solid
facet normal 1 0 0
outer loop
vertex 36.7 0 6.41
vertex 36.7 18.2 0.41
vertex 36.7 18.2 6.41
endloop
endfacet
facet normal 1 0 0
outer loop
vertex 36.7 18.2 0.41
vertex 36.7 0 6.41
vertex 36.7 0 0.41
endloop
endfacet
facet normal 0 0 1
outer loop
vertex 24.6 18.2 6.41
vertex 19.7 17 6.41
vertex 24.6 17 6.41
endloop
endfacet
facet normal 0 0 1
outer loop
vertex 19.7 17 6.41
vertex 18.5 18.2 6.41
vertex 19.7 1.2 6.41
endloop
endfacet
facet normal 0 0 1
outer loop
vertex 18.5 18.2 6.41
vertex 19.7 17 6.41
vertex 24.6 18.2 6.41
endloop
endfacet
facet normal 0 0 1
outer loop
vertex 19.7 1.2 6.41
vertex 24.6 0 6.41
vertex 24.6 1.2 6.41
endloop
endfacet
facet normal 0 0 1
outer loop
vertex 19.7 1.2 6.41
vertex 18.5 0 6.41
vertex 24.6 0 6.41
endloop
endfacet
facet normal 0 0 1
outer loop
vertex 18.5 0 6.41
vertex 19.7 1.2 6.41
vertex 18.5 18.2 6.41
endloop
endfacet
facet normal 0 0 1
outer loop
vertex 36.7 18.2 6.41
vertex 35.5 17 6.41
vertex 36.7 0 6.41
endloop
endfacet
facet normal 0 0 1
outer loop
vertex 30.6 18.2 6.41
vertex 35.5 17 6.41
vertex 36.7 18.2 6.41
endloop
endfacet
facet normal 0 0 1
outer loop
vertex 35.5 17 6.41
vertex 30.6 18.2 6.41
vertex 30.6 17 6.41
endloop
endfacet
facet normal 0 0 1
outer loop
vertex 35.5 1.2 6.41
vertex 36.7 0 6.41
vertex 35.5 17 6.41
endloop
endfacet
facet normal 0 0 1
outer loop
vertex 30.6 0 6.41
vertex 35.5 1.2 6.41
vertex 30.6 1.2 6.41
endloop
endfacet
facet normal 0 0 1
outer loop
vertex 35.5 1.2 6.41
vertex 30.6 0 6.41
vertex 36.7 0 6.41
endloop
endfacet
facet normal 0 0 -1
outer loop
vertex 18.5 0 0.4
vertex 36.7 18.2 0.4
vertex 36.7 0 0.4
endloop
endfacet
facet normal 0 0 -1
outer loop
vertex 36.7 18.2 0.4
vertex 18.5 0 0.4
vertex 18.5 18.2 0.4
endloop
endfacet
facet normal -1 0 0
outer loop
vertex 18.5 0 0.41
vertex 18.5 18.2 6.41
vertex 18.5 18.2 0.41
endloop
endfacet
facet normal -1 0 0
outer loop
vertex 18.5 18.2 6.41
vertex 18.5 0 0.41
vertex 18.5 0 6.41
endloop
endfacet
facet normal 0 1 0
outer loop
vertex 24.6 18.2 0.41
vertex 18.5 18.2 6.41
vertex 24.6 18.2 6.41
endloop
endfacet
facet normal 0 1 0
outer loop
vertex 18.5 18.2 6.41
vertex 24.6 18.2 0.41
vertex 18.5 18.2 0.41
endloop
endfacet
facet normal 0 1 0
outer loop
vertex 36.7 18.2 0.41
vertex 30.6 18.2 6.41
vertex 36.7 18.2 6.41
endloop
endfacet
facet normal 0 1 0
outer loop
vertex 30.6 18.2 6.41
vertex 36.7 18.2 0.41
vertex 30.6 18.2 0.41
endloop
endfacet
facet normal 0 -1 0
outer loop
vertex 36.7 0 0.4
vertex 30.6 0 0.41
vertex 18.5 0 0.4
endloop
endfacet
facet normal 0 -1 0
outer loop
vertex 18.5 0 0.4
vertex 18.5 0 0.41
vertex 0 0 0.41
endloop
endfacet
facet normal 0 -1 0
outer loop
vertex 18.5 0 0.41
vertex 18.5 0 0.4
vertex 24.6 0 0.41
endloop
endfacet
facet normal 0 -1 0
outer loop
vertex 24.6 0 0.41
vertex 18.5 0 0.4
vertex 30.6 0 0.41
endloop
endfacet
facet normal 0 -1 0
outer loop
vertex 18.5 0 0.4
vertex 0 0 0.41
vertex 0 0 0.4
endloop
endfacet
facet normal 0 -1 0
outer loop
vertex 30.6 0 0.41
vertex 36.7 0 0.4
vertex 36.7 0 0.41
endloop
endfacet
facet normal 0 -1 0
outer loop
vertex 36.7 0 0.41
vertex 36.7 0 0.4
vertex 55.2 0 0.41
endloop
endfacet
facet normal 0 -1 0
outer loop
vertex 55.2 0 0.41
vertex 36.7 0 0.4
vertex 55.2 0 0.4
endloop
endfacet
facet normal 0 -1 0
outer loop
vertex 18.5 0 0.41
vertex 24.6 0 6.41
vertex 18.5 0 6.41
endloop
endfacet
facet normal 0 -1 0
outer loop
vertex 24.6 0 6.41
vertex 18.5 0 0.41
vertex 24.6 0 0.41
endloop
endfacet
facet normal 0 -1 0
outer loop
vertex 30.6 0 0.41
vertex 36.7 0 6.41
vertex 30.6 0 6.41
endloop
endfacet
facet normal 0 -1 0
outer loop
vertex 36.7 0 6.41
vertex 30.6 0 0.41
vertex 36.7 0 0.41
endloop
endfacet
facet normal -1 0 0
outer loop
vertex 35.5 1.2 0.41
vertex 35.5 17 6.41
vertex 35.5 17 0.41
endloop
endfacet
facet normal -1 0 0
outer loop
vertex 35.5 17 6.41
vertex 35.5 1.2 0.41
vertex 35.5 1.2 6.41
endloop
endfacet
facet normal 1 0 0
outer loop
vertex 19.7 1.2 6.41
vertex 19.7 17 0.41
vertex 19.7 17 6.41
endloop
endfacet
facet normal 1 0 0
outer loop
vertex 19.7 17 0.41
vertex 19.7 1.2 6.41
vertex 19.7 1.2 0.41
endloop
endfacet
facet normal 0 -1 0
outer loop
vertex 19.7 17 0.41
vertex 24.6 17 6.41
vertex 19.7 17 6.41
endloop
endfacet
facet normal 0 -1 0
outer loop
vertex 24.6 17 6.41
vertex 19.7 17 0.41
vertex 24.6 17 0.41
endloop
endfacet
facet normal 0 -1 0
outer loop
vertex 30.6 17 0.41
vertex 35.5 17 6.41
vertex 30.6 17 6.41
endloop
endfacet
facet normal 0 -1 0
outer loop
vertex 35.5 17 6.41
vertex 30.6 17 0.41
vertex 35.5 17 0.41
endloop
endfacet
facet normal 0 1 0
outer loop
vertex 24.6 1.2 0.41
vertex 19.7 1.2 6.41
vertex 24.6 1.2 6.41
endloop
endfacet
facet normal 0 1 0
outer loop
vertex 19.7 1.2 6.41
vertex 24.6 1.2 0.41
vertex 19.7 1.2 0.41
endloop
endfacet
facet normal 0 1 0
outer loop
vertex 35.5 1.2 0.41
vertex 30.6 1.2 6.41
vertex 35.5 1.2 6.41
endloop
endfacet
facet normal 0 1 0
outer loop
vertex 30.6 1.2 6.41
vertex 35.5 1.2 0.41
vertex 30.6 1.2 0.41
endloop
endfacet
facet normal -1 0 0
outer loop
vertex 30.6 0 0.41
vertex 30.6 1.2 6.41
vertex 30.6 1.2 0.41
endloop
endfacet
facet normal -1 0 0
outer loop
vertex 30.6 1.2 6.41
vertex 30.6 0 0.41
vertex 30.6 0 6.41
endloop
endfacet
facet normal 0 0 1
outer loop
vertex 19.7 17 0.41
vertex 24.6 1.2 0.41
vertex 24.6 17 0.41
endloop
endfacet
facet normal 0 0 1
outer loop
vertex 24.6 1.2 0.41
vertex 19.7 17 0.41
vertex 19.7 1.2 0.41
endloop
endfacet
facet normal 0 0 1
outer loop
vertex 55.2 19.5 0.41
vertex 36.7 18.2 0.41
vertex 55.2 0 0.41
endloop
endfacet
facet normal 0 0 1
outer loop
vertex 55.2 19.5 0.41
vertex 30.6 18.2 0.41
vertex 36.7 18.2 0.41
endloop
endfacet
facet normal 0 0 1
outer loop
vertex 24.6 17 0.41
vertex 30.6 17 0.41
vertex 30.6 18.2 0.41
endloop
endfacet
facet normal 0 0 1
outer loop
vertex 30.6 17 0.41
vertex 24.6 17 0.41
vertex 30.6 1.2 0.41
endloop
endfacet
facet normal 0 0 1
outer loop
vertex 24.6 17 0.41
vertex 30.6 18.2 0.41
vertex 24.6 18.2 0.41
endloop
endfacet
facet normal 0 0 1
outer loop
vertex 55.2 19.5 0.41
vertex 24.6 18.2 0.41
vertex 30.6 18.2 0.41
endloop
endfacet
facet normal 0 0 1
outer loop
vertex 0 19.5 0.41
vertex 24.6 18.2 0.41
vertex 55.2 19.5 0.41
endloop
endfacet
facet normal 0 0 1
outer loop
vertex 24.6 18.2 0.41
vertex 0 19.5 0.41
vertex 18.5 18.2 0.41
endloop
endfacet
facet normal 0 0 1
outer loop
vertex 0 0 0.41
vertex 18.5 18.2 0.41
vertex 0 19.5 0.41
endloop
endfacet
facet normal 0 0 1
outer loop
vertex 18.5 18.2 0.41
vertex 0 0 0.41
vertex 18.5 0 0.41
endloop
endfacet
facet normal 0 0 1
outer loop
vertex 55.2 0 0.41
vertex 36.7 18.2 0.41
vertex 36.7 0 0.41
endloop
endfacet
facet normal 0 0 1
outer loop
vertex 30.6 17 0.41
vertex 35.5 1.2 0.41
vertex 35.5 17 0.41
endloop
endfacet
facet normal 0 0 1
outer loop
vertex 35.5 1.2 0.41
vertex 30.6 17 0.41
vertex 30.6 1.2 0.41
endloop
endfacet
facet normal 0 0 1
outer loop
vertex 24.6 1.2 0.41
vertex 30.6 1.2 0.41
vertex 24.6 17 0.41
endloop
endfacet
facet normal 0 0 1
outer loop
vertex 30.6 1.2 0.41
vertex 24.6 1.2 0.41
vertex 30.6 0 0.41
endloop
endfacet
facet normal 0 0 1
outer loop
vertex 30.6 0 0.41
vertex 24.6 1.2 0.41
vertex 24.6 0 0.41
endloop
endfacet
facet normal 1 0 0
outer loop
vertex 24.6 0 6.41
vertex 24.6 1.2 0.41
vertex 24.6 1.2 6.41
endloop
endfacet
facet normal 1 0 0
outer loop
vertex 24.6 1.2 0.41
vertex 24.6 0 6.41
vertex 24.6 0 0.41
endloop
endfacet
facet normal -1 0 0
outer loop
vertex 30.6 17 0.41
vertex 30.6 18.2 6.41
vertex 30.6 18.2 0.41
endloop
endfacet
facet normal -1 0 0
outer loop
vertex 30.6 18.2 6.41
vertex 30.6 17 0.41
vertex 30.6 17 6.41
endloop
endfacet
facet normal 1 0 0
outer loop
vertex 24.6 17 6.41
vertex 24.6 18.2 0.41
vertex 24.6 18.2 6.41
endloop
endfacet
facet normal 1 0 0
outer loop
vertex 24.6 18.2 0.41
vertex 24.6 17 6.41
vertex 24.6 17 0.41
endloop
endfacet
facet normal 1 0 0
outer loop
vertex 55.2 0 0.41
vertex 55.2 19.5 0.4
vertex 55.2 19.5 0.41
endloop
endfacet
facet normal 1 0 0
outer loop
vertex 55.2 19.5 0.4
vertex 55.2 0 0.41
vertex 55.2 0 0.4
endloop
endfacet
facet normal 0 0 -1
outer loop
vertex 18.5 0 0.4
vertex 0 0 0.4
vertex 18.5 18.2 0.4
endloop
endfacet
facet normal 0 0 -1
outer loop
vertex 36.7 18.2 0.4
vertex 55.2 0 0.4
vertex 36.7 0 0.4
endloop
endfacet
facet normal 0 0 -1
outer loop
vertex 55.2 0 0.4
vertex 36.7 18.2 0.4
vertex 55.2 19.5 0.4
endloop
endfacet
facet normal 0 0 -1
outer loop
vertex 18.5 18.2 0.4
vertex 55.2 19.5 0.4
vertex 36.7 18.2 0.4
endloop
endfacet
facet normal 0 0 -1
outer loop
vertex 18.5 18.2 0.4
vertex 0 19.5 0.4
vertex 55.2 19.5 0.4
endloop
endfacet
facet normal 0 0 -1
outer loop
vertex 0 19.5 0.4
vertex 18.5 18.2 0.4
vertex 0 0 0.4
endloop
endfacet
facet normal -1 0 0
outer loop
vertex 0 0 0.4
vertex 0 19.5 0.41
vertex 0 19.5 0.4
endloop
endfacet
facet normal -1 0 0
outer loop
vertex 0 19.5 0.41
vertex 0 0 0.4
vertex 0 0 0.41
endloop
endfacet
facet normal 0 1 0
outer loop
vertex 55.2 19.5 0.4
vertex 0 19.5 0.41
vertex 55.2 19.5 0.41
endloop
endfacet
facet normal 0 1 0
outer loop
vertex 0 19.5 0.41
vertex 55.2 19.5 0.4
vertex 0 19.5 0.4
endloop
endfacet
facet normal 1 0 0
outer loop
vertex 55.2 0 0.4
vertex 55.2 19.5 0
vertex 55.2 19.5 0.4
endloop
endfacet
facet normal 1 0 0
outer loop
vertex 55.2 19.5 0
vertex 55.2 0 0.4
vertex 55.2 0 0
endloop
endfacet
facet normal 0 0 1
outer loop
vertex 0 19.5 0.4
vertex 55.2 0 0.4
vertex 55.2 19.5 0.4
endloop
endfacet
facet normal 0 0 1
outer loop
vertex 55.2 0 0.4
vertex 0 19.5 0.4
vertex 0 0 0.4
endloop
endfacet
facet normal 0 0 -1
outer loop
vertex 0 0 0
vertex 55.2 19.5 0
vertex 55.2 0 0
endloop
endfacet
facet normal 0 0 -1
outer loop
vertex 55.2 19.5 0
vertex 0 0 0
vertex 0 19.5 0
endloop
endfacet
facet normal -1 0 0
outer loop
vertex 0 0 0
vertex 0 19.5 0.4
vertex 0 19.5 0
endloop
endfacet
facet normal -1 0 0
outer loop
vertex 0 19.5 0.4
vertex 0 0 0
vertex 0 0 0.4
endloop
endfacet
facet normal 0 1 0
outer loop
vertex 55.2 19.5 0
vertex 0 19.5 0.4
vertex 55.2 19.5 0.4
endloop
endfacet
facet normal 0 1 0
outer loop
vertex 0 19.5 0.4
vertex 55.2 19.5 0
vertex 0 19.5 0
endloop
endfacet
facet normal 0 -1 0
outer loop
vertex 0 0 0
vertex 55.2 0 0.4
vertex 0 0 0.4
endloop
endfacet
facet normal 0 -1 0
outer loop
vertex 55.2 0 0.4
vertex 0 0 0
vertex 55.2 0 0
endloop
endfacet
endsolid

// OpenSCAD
// file: ../../Base/PlacementOptions.scad
// Fischertechnik Box Foundation
// Placement Options

// Alignment
NoAlign = 0;
AlignLeft = 1;
AlignBottom = 2;
AlignCenter = 3;
AlignRight = 4;
AlignTop = 5;

// Element rotation degree steps
rotations = [0, -90, -180, -270];

// Rotation
NoRotation = 0;
Rotate0 = 0;
Rotate90 = 1;
Rotate180 = 2;
Rotate270 = 3;

// Docking (seen from above)
NoDock = -1;
DockLeft = 0;
DockTop = 1;
DockRight = 2;
DockCorner = 2;
DockBottom = 3;

// Web corners
LowerLeft = 0;
UpperLeft = 1;
UpperRight = 2;
LowerRight = 3;

// Web position relative to corner
LeftOfCorner = 0;
RightOfCorner = 1;
// file: ../../Base/Boxes.scad
// Fischertechnik Box Foundation
// Pre-designed Boxes

use <Constants.scad>

include <PlacementOptions.scad>

box190Width = 190;
box190Depth = 130;
box130Width = 130;
box130Depth = 95;

// Values are from an original ec3 box
topBottomDifference = 1.5;
outerHeight = 40;
baseThickness = 1.8;
innerHeight = outerHeight - baseThickness;
stackExcess = 5.7;
radius = 3.5;
wallThickness = 1.5;
tolerance = 0.2;

boxWallThickness = wallThickness;
boxBaseThickness = baseThickness;
boxWebWidth = 3.0;

// getBoxWallThickness()
// Gets the wall thickness of a Fischertechnik Box
function getBoxWallThickness() = boxWallThickness;

// getBoxUsageHeight(height = 38.2)
// Gets the usable height of a Fischertechnik box
// height = Outer height of the box from the bottom to the upper edge.
function getBoxUsageHeight(height = outerHeight) = height - baseThickness - stackExcess;

// getBoxInnerHeight()
// Gets the inner height of a Fischertechnik box, including the stack excess
function getBoxInnerHeight() = innerHeight;

// getBoxBaseThickness()
// Gets the thickness of the Fischertechnik box base.
function getBoxBaseThickness() = boxBaseThickness;

// getBoxWebWidth()
// Gets the width of a box web
function getBoxWebWidth() = boxWebWidth;

// getBox190Space()
// Gets the usable inner space of a Box 190 as an x/y-list
function getBox190Space() = [
    box190Width - 2*getBoxWallThickness() - topBottomDifference, 
    box190Depth - 2*getBoxWallThickness() - topBottomDifference ];

// RoundedCornerPlate(width, depth, height, radius)
// Creates a body plate with rounded corners for a box. Used
// also to create the complete box with the hull module.
// width = Width of the plate
// depth = depth of the plate 
// height = thickness of the plate
// radius = radius of the rounded corner
module RoundedCornerPlate(width, depth, height, radius) {
    translate([radius, radius])
    hull() {
        w = width-2*radius;
        d = depth-2*radius;
        cube([w, d, height]);
        cylinder(height, r=radius, $fn=getFragments());
        translate([w, 0])
            cylinder(height, r=radius, $fn=getFragments());
        translate([w, d])
            cylinder(height, r=radius, $fn=getFragments());
        translate([0, d])
            cylinder(height, r=radius, $fn=getFragments());
    }
}

// BoxBase(width, depth)
// Creates an empty stackable Fischertechnik compatible box
// width = Outer width of the box (190, 130, ...)
// depth = Outer depth of the box (130, 95, ...)

module BoxBase(width, depth, height=outerHeight) {    
    thinPlate = 0.01;

    innerHeight = height - baseThickness;    
    
    module Body(tolerance=tolerance) {
        hull() {
            // Bottom with tolerance to fit into the original boxes when stacked
            translate([-wallThickness+tolerance, -wallThickness+tolerance, -baseThickness])
                RoundedCornerPlate(width-topBottomDifference-2*tolerance, depth-topBottomDifference-2*tolerance, thinPlate, radius);
            
            // Top
            translate([-wallThickness-topBottomDifference/2, -wallThickness-topBottomDifference/2, innerHeight-thinPlate])
                RoundedCornerPlate(width, depth, thinPlate, radius);
         }
    }

    module Cutoff() {
        hull() {
            coWidth = width - 2*wallThickness;
            coDepth = depth - 2*wallThickness;
            
            // Bottom
            RoundedCornerPlate(coWidth-topBottomDifference, coDepth-topBottomDifference, thinPlate, radius);

            // Top
            translate([-topBottomDifference/2, -topBottomDifference/2, innerHeight+thinPlate]) 
                RoundedCornerPlate(coWidth, coDepth, thinPlate, radius);
        }
    }
    
    difference() {        
        Body();
        Cutoff();
        stackOffset = innerHeight - stackExcess;
        translate([0, 0, stackOffset + baseThickness])
            Body(tolerance=0);
    }
}

// Creates the Fischertechnik empty box 130x190 mm and places it at position 0,0
// 190x130 are the outer sizes, the inner space is slightly smaller. Use getBox190Space() to get the inner sizes.
// The box is positioned that the usable inner space is at the 0,0,0 position.

module Box190() {
    BoxBase(box190Width, box190Depth);
}

// Gets the usable inner space of a Box 130 as an x/y-list
function getBox130Space() = [
    box130Width - 2*getBoxWallThickness() - topBottomDifference, 
    box130Depth - 2*getBoxWallThickness() - topBottomDifference ];

// Creates the Fischertechnik empty box 95x130 mm and places it at position 0,0
// 190x130 are the outer sizes, the inner space is slightly smaller. Use getBox190Space() to get the inner sizes.
// The box is positioned that the usable inner space is at the 0,0,0 position.

module Box130() {
    BoxBase(box130Width, box130Depth);
}

// Creates a web at the specified box walls
// corner 0 = LowerLeft, 1 = UpperLeft, 2 = UpperRight, 3 = LowerRight
// side 0 = LeftOfCorner, 1 = RightOfCorner
// distance = Distance in mm from the corner
// boxSpace = inner width and depth of the box (default: Box 190)
// webWidth = length of the web (default is 3 mms)
// webThickness = thickness of the web (default is 1 mm)
// height = Height of the web (standard is getBoxUsageHeight())

module BoxWeb(corner, side, distance, boxSpace=getBox190Space(), webWidth=getBoxWebWidth(), webThickness=1.0, height=getBoxUsageHeight()) {
    sink = getBoxWallThickness()/2;

    width = (corner % 2 == 0) ? 
            (side == LeftOfCorner ? webWidth : webThickness) :
            (side == LeftOfCorner ? webThickness : webWidth);

    depth = (corner % 2 == 0) ? 
            (side == RightOfCorner ? webWidth : webThickness) :
            (side == RightOfCorner ? webThickness : webWidth);
    
    xDiff = corner == LowerLeft ? 
                (side == LeftOfCorner ? -sink : distance) :
            (corner == UpperLeft ?                
                (side == LeftOfCorner ? distance : -sink) :
            (corner == UpperRight ?
                (side == LeftOfCorner ? boxSpace.x-webWidth+sink : boxSpace.x-distance-webThickness) :
                (side == LeftOfCorner ? boxSpace.x-distance-webThickness: boxSpace.x-webWidth+sink)));

    yDiff = corner == LowerLeft ? 
                (side == RightOfCorner ? -sink : distance) :
            (corner == UpperLeft ?
                (side == RightOfCorner ? boxSpace.y-distance-webThickness : boxSpace.y-webWidth+sink) :
            (corner == UpperRight ?
                (side == RightOfCorner ? boxSpace.y-webWidth+sink : boxSpace.y-distance-webThickness) :
                (side == RightOfCorner ? distance : -sink)));
    
    translate([xDiff, yDiff, -getExcess()])
        cube([width, depth, height + 2*getExcess()]);
}
// file: ../../Base/Rotation.scad
// Fischertechnik Box Foundation
// Geometry Helpers Rotation

include <PlacementOptions.scad>

// getRotatedSpace(space, rotation=NoRotation)
// Rotates the space dependent on the specified rotation

function getRotatedSpace(space, rotation=NoRotation) = [
    (rotation == Rotate90 || rotation == Rotate270) ? space.y : space.x,
    (rotation == Rotate90 || rotation == Rotate270) ? space.x : space.y
];

// Rotates the given space around the fixed left lower corner
// space = the space the children needs as width/depth list [width,depth]
// rotation = 0 Rotate0 degrees, 1 Rotate90 degrees, 2 Rotate180 degrees, 3 Rotate270 degrees (equivalent to -90)

module RotateFix(space, rotation=NoRotation) {
    dy = (rotation == Rotate0 || rotation == Rotate270) ? 0 :
        (rotation == Rotate90) ? space.x :
        space.y;
    dx = (rotation < Rotate180) ? 0 :
        (rotation == Rotate180) ? space.x :
        space.y;
    
    translate([dx, dy, 0])
        rotate([0, 0, rotations[rotation]])
            children();
}
// file: ../../Base/Alignment.scad
// Fischertechnik Box Foundation
// Geometry Helpers Alignment

include <PlacementOptions.scad>

// getAlignedX(elementWidth, spaceWidth, align=AlignRight, offset=0)
// Gets the aligned X offset of an element with the given
// width in the given space.
// elementWidth = The width of the element to positon
// spaceWidth = The space where the element should be aligned
// align = 0 AlignLeft, 1 AlignCenter, 2 AlignRight
// offset = an optional offset from the aligned position. When
// aligned left or centered, then positive values are in X direction.
// When aligned right then positive values are in negative X direction.

function getAlignedX(elementWidth, spaceWidth, align=AlignRight, offset=0) =
    (align == AlignLeft) ?
        offset :
        ((align == AlignCenter) ?
        (spaceWidth - elementWidth)/2 + offset :
        spaceWidth - offset - elementWidth);

// getAlignedY(elementDepth, spaceDepth, align=AlignTop, offset=0)
// Gets the aligned Y offset of an element with the given
// depth in the given space.
// elementDepth = The depth of the element to positon
// spaceDepth = The space where the element should be aligned
// align = 0 AlignBottom, 1 AlignCenter, 2 AlignTop
// offset = an optional offset from the aligned position. When
// aligned bottom or centered, then positive values are in Y direction.
// When aligned top then positive values are in negative Y direction.

function getAlignedY(elementDepth, spaceDepth, align=AlignTop, offset=0) =
    (align == AlignBottom) ?
        offset :
        ((align == AlignCenter) ?
        (spaceDepth - elementDepth)/2 + offset :
        spaceDepth - offset - elementDepth);
// file: ../../Base/Placement.scad
// Fischertechnik Box Foundation
// Geometry Helpers Placement

use <Constants.scad>
use <Alignment.scad>
use <Rotation.scad>
use <Boxes.scad>

include <PlacementOptions.scad>

// Place(x=0, y=0, elementSpace=[0,0], alignX=AlignLeft, alignY=AlignBottom, rotation=Rotate0, boxSpace=getBox190Space())
// Places the child at the specified position
// y = Y-Position. This is a relative position when an X aligment is specified.
// x = X-Position. This is a relative position when an Y aligment is specified.
// elementSpace = space of the element to be placed [x,y]
// alignX = -1=NoAlign, 0 AlignLeft, 1 AlignCenter, 3 AlignRight (elementSpace and boxSpace required!)
// alignY = -1=NoAlign, 2 AlignBottom, 1 AlignCenter, 4 AlignTop (elementSpace and boxSpace required!)
// rotation = 0 Rotate0 0 degrees, 1 Rotate90 90 degrees, 
// 2 Rotate180 180 degrees, 3 Rotate270 270 degrees (equivalent to -90)
// boxSpace = Inner space of the box where the placement occurs [x,y] - default is Box 190x130 inner space

module Place(x=0, y=0, elementSpace=[0,0], 
  alignX=AlignLeft, alignY=AlignBottom, 
  rotation=NoRotation, boxSpace=getBox190Space()) {

    module Position(x, y, space, rotation=Rotate0) {
        translate([x, y, 0])
            RotateFix(space, rotation)
                children();
    }

    space = getRotatedSpace(elementSpace, rotation);
    alignedX = getAlignedX(space.x, boxSpace.x, alignX, x);
    alignedY = getAlignedY(space.y, boxSpace.y, alignY, y);
    Position(alignedX, alignedY, elementSpace, rotation)
        children();
}

// Center(space=getBox130Space(), elementSpace=[0,0])
// space = Space where the children is centered. For cylinder use centered=true and no elementSpace.
// elementSpace = space of the element to be centered [x,y]

module Center(space=getBox190Space(), elementSpace=[0,0]) {
    Place(elementSpace=elementSpace, boxSpace=space, alignX=AlignCenter, alignY=AlignCenter)
        children();
}

// CenterHorizontal(width=0, y=0, offset=0, space=getBox130Space())
// width = Width of the element to be placed.
// y = Y position of the element
// offset = Offset from the center position (negative will be left of the center)
// space = Space where the element is placed

module CenterHorizontal(width=0, y=0, offset=0, space=getBox190Space()) {
    Place(x=offset, y=y, elementSpace=[width, 0], boxSpace=space, alignX=AlignCenter)
        children(0);
}

// CenterVertical(depth=0, x=0, offset=0, space=getBox130Space())
// depth = Depth of the element to be placed.
// x = X position of the element
// offset = Offset from the center position (negative will be down of the center)
// space = Space where the element is placed

module CenterVertical(depth=0, x=0, offset=0, space=getBox190Space()) {
    Place(x=x, y=offset, elementSpace=[0, depth], boxSpace=space, alignY=AlignCenter)
        children(0);
}

// getIsVertical(align)
// True if the specified alignment needs a vertical orientation for a divider (AlignRight, AlignLeft)

function getIsVertical(align) = (align == AlignRight || align == AlignLeft);

// getIsHorizontal(align)
// True if the specified alignment needs a horizontal orientation for a divider (AlignTop, AlignBottom)

function getIsHorizontal(align) = (align == AlignTop || align == AlignBottom);
// file: ../../Elements/AxisClip10.scad
// Fischertechnik Box Library
// Axis for clip 10
// 31023

use <../ModelBase/Simple.scad>
use <../Base/Constants.scad>

/* [Element Parameters] */
height = 23;
clipHeight = 10;

/* [Hidden] */
width = 12;
depth = 12;
upperDiameter = 3.6;

// getAxisClip10Space()
// Gets the space of a n axis for a clip 10 with spring ring (mot2)

function getAxisClip10Space() = [width, depth, height];

// AxisClip10(height, clipHeight)
// Axis for clip 10 with spring ring (mot2)
// height = Height of the complete axis (standard is 23, in mot3 its only 12)
// clipHeight = Height of the part for the clip (standard is 10, in mot3 its only 7)

module AxisClip10(height=height, clipHeight=clipHeight) {
    LeveledAxisWithSpace(height, height-clipHeight, getAxisClip10Space(), diameter=upperDiameter);
}

// Test
color("lightgray")
AxisClip10(height, clipHeight);
// file: ../../Base/Constants.scad
// Fischertechnik Box Foundation
// Constants

// Constant values necessary for multiple elements

// Base constants
dividerThickness = 1.2;
excess = 0.01;
fragments = 90;
tolerance = 0.8;

// Gets the thickness of a divider 
function getDividerThickness() = dividerThickness;

// Gets the excess that is used to merge walls into each other
function getExcess() = excess;

// Gets amount of fragments of a cylinder
function getFragments() = fragments;

// Gets the inner tolerance of a frame to each side
function getTolerance() = tolerance;


// Fischertechnik specific constants
axisDiameter = 4;
axisBottomDiameter = axisDiameter + 1;
axisTolerance = 0.2;

// Gets axis diameter of Fischertechnik axis
function getAxisDiameter() = axisDiameter;

// Gets axis diameter tolerance (subtracted for element axis)
function getAxisTolerance() = axisTolerance;

// Gets the axis diameter for standing axis
function getStandAxisDiameter() = getAxisDiameter() - getAxisTolerance();

// Gets axis bottom diameter for thicker part at the bottom
function getAxisBottomDiameter() = axisBottomDiameter;

pinHeight = 2.5;

// gets the height of a connecting pin
function getPinHeight() = pinHeight;

standardEdgeDistance = 2.5;
standardWebDistance = 11.5;
standardCornerLength = 15;

// gets the standard distance to the wall of the box for dockable frames with webs
function getStandardEdgeDistance() = standardEdgeDistance;

// gets the standard distance of each web to the corner of the dockable frame
function getStandardWebDistance() = standardWebDistance;

// gets the standard length of the corner walls of a dockable frame
function getStandardCornerLength() = standardCornerLength;

tubeWallFactor = 0.8;

// gets the wall thickness of a tube.
function getTubeWallThickness() = tubeWallFactor * getDividerThickness();

smallPartsFrameHeight = 20;

// gets the frame height for docked small parts boxes.
function getSmallPartsFrameHeight() = smallPartsFrameHeight;

hubRingDiameter = 19.5;
hubRingLevelDiameter = 21;

// gets the diameter of a tube matching the inner ring of a wheel
function getHubRingDiameter() = hubRingDiameter;

// gets the diameter of a hub tube with a thicker diameter
function getHubRingLevelDiameter() = hubRingLevelDiameter;
// file: ../../Elements/FrameGearBlock.scad
// Fischertechnik Box Library
// Frame for gear block for mini-motor
// 31067

use <../Base/Constants.scad>
use <../Base/Placement.scad>
use <../ModelBase/Simple.scad>

/* [Hidden] */
width = 52;
depth = 15;
height = 6;

// getFrameGearBlockSpace()
// Gets the space of a frame for a gear block (mini-mot 1)

function getFrameGearBlockSpace() = getFrameOuterVolume([width, depth + getPinHeight() - getDividerThickness(), height]);

// FrameGearBlock()
// frame for a gear block (mini-mot 1)

module FrameGearBlock() {
    Space(getFrameGearBlockSpace());
    blockWidth = 15;
    volume = [blockWidth, depth, height];
    CenterHorizontal(getFrameOuterVolume(volume).x, space=getFrameGearBlockSpace())
    {
        cutoffWidth = 6;
        difference() {
            Frame(volume);
            translate([(getFrameOuterVolume(volume).x - cutoffWidth)/2, 0]) {
                translate([0, -getExcess()])
                    cube([cutoffWidth, 2*getDividerThickness(), height + getExcess()]);
                translate([0, getFrameOuterVolume(volume).y - 1.5*getDividerThickness()])
                    cube([cutoffWidth, 2*getDividerThickness(), height + getExcess()]);
            }
        }
    }
}

// Tests
color("lightgray")
FrameGearBlock();
// file: ../TestPrint.scad
// 3D Print Test Base

use <../Base/Constants.scad>

use <../Elements/AxisClip10.scad>

module TestPrint(elementSpace) {
    cube([elementSpace.x, elementSpace.y, 0.4]);
    translate([0,0,0.4+getExcess()]) {
        children();
    }
}

TestPrint(getAxisClip10Space())
    AxisClip10();
// main file
// 3D Print Test
// FrameGearBlock

use <../TestPrint.scad>
use <../../Elements/FrameGearBlock.scad>

TestPrint(getFrameGearBlockSpace())
    FrameGearBlock();
